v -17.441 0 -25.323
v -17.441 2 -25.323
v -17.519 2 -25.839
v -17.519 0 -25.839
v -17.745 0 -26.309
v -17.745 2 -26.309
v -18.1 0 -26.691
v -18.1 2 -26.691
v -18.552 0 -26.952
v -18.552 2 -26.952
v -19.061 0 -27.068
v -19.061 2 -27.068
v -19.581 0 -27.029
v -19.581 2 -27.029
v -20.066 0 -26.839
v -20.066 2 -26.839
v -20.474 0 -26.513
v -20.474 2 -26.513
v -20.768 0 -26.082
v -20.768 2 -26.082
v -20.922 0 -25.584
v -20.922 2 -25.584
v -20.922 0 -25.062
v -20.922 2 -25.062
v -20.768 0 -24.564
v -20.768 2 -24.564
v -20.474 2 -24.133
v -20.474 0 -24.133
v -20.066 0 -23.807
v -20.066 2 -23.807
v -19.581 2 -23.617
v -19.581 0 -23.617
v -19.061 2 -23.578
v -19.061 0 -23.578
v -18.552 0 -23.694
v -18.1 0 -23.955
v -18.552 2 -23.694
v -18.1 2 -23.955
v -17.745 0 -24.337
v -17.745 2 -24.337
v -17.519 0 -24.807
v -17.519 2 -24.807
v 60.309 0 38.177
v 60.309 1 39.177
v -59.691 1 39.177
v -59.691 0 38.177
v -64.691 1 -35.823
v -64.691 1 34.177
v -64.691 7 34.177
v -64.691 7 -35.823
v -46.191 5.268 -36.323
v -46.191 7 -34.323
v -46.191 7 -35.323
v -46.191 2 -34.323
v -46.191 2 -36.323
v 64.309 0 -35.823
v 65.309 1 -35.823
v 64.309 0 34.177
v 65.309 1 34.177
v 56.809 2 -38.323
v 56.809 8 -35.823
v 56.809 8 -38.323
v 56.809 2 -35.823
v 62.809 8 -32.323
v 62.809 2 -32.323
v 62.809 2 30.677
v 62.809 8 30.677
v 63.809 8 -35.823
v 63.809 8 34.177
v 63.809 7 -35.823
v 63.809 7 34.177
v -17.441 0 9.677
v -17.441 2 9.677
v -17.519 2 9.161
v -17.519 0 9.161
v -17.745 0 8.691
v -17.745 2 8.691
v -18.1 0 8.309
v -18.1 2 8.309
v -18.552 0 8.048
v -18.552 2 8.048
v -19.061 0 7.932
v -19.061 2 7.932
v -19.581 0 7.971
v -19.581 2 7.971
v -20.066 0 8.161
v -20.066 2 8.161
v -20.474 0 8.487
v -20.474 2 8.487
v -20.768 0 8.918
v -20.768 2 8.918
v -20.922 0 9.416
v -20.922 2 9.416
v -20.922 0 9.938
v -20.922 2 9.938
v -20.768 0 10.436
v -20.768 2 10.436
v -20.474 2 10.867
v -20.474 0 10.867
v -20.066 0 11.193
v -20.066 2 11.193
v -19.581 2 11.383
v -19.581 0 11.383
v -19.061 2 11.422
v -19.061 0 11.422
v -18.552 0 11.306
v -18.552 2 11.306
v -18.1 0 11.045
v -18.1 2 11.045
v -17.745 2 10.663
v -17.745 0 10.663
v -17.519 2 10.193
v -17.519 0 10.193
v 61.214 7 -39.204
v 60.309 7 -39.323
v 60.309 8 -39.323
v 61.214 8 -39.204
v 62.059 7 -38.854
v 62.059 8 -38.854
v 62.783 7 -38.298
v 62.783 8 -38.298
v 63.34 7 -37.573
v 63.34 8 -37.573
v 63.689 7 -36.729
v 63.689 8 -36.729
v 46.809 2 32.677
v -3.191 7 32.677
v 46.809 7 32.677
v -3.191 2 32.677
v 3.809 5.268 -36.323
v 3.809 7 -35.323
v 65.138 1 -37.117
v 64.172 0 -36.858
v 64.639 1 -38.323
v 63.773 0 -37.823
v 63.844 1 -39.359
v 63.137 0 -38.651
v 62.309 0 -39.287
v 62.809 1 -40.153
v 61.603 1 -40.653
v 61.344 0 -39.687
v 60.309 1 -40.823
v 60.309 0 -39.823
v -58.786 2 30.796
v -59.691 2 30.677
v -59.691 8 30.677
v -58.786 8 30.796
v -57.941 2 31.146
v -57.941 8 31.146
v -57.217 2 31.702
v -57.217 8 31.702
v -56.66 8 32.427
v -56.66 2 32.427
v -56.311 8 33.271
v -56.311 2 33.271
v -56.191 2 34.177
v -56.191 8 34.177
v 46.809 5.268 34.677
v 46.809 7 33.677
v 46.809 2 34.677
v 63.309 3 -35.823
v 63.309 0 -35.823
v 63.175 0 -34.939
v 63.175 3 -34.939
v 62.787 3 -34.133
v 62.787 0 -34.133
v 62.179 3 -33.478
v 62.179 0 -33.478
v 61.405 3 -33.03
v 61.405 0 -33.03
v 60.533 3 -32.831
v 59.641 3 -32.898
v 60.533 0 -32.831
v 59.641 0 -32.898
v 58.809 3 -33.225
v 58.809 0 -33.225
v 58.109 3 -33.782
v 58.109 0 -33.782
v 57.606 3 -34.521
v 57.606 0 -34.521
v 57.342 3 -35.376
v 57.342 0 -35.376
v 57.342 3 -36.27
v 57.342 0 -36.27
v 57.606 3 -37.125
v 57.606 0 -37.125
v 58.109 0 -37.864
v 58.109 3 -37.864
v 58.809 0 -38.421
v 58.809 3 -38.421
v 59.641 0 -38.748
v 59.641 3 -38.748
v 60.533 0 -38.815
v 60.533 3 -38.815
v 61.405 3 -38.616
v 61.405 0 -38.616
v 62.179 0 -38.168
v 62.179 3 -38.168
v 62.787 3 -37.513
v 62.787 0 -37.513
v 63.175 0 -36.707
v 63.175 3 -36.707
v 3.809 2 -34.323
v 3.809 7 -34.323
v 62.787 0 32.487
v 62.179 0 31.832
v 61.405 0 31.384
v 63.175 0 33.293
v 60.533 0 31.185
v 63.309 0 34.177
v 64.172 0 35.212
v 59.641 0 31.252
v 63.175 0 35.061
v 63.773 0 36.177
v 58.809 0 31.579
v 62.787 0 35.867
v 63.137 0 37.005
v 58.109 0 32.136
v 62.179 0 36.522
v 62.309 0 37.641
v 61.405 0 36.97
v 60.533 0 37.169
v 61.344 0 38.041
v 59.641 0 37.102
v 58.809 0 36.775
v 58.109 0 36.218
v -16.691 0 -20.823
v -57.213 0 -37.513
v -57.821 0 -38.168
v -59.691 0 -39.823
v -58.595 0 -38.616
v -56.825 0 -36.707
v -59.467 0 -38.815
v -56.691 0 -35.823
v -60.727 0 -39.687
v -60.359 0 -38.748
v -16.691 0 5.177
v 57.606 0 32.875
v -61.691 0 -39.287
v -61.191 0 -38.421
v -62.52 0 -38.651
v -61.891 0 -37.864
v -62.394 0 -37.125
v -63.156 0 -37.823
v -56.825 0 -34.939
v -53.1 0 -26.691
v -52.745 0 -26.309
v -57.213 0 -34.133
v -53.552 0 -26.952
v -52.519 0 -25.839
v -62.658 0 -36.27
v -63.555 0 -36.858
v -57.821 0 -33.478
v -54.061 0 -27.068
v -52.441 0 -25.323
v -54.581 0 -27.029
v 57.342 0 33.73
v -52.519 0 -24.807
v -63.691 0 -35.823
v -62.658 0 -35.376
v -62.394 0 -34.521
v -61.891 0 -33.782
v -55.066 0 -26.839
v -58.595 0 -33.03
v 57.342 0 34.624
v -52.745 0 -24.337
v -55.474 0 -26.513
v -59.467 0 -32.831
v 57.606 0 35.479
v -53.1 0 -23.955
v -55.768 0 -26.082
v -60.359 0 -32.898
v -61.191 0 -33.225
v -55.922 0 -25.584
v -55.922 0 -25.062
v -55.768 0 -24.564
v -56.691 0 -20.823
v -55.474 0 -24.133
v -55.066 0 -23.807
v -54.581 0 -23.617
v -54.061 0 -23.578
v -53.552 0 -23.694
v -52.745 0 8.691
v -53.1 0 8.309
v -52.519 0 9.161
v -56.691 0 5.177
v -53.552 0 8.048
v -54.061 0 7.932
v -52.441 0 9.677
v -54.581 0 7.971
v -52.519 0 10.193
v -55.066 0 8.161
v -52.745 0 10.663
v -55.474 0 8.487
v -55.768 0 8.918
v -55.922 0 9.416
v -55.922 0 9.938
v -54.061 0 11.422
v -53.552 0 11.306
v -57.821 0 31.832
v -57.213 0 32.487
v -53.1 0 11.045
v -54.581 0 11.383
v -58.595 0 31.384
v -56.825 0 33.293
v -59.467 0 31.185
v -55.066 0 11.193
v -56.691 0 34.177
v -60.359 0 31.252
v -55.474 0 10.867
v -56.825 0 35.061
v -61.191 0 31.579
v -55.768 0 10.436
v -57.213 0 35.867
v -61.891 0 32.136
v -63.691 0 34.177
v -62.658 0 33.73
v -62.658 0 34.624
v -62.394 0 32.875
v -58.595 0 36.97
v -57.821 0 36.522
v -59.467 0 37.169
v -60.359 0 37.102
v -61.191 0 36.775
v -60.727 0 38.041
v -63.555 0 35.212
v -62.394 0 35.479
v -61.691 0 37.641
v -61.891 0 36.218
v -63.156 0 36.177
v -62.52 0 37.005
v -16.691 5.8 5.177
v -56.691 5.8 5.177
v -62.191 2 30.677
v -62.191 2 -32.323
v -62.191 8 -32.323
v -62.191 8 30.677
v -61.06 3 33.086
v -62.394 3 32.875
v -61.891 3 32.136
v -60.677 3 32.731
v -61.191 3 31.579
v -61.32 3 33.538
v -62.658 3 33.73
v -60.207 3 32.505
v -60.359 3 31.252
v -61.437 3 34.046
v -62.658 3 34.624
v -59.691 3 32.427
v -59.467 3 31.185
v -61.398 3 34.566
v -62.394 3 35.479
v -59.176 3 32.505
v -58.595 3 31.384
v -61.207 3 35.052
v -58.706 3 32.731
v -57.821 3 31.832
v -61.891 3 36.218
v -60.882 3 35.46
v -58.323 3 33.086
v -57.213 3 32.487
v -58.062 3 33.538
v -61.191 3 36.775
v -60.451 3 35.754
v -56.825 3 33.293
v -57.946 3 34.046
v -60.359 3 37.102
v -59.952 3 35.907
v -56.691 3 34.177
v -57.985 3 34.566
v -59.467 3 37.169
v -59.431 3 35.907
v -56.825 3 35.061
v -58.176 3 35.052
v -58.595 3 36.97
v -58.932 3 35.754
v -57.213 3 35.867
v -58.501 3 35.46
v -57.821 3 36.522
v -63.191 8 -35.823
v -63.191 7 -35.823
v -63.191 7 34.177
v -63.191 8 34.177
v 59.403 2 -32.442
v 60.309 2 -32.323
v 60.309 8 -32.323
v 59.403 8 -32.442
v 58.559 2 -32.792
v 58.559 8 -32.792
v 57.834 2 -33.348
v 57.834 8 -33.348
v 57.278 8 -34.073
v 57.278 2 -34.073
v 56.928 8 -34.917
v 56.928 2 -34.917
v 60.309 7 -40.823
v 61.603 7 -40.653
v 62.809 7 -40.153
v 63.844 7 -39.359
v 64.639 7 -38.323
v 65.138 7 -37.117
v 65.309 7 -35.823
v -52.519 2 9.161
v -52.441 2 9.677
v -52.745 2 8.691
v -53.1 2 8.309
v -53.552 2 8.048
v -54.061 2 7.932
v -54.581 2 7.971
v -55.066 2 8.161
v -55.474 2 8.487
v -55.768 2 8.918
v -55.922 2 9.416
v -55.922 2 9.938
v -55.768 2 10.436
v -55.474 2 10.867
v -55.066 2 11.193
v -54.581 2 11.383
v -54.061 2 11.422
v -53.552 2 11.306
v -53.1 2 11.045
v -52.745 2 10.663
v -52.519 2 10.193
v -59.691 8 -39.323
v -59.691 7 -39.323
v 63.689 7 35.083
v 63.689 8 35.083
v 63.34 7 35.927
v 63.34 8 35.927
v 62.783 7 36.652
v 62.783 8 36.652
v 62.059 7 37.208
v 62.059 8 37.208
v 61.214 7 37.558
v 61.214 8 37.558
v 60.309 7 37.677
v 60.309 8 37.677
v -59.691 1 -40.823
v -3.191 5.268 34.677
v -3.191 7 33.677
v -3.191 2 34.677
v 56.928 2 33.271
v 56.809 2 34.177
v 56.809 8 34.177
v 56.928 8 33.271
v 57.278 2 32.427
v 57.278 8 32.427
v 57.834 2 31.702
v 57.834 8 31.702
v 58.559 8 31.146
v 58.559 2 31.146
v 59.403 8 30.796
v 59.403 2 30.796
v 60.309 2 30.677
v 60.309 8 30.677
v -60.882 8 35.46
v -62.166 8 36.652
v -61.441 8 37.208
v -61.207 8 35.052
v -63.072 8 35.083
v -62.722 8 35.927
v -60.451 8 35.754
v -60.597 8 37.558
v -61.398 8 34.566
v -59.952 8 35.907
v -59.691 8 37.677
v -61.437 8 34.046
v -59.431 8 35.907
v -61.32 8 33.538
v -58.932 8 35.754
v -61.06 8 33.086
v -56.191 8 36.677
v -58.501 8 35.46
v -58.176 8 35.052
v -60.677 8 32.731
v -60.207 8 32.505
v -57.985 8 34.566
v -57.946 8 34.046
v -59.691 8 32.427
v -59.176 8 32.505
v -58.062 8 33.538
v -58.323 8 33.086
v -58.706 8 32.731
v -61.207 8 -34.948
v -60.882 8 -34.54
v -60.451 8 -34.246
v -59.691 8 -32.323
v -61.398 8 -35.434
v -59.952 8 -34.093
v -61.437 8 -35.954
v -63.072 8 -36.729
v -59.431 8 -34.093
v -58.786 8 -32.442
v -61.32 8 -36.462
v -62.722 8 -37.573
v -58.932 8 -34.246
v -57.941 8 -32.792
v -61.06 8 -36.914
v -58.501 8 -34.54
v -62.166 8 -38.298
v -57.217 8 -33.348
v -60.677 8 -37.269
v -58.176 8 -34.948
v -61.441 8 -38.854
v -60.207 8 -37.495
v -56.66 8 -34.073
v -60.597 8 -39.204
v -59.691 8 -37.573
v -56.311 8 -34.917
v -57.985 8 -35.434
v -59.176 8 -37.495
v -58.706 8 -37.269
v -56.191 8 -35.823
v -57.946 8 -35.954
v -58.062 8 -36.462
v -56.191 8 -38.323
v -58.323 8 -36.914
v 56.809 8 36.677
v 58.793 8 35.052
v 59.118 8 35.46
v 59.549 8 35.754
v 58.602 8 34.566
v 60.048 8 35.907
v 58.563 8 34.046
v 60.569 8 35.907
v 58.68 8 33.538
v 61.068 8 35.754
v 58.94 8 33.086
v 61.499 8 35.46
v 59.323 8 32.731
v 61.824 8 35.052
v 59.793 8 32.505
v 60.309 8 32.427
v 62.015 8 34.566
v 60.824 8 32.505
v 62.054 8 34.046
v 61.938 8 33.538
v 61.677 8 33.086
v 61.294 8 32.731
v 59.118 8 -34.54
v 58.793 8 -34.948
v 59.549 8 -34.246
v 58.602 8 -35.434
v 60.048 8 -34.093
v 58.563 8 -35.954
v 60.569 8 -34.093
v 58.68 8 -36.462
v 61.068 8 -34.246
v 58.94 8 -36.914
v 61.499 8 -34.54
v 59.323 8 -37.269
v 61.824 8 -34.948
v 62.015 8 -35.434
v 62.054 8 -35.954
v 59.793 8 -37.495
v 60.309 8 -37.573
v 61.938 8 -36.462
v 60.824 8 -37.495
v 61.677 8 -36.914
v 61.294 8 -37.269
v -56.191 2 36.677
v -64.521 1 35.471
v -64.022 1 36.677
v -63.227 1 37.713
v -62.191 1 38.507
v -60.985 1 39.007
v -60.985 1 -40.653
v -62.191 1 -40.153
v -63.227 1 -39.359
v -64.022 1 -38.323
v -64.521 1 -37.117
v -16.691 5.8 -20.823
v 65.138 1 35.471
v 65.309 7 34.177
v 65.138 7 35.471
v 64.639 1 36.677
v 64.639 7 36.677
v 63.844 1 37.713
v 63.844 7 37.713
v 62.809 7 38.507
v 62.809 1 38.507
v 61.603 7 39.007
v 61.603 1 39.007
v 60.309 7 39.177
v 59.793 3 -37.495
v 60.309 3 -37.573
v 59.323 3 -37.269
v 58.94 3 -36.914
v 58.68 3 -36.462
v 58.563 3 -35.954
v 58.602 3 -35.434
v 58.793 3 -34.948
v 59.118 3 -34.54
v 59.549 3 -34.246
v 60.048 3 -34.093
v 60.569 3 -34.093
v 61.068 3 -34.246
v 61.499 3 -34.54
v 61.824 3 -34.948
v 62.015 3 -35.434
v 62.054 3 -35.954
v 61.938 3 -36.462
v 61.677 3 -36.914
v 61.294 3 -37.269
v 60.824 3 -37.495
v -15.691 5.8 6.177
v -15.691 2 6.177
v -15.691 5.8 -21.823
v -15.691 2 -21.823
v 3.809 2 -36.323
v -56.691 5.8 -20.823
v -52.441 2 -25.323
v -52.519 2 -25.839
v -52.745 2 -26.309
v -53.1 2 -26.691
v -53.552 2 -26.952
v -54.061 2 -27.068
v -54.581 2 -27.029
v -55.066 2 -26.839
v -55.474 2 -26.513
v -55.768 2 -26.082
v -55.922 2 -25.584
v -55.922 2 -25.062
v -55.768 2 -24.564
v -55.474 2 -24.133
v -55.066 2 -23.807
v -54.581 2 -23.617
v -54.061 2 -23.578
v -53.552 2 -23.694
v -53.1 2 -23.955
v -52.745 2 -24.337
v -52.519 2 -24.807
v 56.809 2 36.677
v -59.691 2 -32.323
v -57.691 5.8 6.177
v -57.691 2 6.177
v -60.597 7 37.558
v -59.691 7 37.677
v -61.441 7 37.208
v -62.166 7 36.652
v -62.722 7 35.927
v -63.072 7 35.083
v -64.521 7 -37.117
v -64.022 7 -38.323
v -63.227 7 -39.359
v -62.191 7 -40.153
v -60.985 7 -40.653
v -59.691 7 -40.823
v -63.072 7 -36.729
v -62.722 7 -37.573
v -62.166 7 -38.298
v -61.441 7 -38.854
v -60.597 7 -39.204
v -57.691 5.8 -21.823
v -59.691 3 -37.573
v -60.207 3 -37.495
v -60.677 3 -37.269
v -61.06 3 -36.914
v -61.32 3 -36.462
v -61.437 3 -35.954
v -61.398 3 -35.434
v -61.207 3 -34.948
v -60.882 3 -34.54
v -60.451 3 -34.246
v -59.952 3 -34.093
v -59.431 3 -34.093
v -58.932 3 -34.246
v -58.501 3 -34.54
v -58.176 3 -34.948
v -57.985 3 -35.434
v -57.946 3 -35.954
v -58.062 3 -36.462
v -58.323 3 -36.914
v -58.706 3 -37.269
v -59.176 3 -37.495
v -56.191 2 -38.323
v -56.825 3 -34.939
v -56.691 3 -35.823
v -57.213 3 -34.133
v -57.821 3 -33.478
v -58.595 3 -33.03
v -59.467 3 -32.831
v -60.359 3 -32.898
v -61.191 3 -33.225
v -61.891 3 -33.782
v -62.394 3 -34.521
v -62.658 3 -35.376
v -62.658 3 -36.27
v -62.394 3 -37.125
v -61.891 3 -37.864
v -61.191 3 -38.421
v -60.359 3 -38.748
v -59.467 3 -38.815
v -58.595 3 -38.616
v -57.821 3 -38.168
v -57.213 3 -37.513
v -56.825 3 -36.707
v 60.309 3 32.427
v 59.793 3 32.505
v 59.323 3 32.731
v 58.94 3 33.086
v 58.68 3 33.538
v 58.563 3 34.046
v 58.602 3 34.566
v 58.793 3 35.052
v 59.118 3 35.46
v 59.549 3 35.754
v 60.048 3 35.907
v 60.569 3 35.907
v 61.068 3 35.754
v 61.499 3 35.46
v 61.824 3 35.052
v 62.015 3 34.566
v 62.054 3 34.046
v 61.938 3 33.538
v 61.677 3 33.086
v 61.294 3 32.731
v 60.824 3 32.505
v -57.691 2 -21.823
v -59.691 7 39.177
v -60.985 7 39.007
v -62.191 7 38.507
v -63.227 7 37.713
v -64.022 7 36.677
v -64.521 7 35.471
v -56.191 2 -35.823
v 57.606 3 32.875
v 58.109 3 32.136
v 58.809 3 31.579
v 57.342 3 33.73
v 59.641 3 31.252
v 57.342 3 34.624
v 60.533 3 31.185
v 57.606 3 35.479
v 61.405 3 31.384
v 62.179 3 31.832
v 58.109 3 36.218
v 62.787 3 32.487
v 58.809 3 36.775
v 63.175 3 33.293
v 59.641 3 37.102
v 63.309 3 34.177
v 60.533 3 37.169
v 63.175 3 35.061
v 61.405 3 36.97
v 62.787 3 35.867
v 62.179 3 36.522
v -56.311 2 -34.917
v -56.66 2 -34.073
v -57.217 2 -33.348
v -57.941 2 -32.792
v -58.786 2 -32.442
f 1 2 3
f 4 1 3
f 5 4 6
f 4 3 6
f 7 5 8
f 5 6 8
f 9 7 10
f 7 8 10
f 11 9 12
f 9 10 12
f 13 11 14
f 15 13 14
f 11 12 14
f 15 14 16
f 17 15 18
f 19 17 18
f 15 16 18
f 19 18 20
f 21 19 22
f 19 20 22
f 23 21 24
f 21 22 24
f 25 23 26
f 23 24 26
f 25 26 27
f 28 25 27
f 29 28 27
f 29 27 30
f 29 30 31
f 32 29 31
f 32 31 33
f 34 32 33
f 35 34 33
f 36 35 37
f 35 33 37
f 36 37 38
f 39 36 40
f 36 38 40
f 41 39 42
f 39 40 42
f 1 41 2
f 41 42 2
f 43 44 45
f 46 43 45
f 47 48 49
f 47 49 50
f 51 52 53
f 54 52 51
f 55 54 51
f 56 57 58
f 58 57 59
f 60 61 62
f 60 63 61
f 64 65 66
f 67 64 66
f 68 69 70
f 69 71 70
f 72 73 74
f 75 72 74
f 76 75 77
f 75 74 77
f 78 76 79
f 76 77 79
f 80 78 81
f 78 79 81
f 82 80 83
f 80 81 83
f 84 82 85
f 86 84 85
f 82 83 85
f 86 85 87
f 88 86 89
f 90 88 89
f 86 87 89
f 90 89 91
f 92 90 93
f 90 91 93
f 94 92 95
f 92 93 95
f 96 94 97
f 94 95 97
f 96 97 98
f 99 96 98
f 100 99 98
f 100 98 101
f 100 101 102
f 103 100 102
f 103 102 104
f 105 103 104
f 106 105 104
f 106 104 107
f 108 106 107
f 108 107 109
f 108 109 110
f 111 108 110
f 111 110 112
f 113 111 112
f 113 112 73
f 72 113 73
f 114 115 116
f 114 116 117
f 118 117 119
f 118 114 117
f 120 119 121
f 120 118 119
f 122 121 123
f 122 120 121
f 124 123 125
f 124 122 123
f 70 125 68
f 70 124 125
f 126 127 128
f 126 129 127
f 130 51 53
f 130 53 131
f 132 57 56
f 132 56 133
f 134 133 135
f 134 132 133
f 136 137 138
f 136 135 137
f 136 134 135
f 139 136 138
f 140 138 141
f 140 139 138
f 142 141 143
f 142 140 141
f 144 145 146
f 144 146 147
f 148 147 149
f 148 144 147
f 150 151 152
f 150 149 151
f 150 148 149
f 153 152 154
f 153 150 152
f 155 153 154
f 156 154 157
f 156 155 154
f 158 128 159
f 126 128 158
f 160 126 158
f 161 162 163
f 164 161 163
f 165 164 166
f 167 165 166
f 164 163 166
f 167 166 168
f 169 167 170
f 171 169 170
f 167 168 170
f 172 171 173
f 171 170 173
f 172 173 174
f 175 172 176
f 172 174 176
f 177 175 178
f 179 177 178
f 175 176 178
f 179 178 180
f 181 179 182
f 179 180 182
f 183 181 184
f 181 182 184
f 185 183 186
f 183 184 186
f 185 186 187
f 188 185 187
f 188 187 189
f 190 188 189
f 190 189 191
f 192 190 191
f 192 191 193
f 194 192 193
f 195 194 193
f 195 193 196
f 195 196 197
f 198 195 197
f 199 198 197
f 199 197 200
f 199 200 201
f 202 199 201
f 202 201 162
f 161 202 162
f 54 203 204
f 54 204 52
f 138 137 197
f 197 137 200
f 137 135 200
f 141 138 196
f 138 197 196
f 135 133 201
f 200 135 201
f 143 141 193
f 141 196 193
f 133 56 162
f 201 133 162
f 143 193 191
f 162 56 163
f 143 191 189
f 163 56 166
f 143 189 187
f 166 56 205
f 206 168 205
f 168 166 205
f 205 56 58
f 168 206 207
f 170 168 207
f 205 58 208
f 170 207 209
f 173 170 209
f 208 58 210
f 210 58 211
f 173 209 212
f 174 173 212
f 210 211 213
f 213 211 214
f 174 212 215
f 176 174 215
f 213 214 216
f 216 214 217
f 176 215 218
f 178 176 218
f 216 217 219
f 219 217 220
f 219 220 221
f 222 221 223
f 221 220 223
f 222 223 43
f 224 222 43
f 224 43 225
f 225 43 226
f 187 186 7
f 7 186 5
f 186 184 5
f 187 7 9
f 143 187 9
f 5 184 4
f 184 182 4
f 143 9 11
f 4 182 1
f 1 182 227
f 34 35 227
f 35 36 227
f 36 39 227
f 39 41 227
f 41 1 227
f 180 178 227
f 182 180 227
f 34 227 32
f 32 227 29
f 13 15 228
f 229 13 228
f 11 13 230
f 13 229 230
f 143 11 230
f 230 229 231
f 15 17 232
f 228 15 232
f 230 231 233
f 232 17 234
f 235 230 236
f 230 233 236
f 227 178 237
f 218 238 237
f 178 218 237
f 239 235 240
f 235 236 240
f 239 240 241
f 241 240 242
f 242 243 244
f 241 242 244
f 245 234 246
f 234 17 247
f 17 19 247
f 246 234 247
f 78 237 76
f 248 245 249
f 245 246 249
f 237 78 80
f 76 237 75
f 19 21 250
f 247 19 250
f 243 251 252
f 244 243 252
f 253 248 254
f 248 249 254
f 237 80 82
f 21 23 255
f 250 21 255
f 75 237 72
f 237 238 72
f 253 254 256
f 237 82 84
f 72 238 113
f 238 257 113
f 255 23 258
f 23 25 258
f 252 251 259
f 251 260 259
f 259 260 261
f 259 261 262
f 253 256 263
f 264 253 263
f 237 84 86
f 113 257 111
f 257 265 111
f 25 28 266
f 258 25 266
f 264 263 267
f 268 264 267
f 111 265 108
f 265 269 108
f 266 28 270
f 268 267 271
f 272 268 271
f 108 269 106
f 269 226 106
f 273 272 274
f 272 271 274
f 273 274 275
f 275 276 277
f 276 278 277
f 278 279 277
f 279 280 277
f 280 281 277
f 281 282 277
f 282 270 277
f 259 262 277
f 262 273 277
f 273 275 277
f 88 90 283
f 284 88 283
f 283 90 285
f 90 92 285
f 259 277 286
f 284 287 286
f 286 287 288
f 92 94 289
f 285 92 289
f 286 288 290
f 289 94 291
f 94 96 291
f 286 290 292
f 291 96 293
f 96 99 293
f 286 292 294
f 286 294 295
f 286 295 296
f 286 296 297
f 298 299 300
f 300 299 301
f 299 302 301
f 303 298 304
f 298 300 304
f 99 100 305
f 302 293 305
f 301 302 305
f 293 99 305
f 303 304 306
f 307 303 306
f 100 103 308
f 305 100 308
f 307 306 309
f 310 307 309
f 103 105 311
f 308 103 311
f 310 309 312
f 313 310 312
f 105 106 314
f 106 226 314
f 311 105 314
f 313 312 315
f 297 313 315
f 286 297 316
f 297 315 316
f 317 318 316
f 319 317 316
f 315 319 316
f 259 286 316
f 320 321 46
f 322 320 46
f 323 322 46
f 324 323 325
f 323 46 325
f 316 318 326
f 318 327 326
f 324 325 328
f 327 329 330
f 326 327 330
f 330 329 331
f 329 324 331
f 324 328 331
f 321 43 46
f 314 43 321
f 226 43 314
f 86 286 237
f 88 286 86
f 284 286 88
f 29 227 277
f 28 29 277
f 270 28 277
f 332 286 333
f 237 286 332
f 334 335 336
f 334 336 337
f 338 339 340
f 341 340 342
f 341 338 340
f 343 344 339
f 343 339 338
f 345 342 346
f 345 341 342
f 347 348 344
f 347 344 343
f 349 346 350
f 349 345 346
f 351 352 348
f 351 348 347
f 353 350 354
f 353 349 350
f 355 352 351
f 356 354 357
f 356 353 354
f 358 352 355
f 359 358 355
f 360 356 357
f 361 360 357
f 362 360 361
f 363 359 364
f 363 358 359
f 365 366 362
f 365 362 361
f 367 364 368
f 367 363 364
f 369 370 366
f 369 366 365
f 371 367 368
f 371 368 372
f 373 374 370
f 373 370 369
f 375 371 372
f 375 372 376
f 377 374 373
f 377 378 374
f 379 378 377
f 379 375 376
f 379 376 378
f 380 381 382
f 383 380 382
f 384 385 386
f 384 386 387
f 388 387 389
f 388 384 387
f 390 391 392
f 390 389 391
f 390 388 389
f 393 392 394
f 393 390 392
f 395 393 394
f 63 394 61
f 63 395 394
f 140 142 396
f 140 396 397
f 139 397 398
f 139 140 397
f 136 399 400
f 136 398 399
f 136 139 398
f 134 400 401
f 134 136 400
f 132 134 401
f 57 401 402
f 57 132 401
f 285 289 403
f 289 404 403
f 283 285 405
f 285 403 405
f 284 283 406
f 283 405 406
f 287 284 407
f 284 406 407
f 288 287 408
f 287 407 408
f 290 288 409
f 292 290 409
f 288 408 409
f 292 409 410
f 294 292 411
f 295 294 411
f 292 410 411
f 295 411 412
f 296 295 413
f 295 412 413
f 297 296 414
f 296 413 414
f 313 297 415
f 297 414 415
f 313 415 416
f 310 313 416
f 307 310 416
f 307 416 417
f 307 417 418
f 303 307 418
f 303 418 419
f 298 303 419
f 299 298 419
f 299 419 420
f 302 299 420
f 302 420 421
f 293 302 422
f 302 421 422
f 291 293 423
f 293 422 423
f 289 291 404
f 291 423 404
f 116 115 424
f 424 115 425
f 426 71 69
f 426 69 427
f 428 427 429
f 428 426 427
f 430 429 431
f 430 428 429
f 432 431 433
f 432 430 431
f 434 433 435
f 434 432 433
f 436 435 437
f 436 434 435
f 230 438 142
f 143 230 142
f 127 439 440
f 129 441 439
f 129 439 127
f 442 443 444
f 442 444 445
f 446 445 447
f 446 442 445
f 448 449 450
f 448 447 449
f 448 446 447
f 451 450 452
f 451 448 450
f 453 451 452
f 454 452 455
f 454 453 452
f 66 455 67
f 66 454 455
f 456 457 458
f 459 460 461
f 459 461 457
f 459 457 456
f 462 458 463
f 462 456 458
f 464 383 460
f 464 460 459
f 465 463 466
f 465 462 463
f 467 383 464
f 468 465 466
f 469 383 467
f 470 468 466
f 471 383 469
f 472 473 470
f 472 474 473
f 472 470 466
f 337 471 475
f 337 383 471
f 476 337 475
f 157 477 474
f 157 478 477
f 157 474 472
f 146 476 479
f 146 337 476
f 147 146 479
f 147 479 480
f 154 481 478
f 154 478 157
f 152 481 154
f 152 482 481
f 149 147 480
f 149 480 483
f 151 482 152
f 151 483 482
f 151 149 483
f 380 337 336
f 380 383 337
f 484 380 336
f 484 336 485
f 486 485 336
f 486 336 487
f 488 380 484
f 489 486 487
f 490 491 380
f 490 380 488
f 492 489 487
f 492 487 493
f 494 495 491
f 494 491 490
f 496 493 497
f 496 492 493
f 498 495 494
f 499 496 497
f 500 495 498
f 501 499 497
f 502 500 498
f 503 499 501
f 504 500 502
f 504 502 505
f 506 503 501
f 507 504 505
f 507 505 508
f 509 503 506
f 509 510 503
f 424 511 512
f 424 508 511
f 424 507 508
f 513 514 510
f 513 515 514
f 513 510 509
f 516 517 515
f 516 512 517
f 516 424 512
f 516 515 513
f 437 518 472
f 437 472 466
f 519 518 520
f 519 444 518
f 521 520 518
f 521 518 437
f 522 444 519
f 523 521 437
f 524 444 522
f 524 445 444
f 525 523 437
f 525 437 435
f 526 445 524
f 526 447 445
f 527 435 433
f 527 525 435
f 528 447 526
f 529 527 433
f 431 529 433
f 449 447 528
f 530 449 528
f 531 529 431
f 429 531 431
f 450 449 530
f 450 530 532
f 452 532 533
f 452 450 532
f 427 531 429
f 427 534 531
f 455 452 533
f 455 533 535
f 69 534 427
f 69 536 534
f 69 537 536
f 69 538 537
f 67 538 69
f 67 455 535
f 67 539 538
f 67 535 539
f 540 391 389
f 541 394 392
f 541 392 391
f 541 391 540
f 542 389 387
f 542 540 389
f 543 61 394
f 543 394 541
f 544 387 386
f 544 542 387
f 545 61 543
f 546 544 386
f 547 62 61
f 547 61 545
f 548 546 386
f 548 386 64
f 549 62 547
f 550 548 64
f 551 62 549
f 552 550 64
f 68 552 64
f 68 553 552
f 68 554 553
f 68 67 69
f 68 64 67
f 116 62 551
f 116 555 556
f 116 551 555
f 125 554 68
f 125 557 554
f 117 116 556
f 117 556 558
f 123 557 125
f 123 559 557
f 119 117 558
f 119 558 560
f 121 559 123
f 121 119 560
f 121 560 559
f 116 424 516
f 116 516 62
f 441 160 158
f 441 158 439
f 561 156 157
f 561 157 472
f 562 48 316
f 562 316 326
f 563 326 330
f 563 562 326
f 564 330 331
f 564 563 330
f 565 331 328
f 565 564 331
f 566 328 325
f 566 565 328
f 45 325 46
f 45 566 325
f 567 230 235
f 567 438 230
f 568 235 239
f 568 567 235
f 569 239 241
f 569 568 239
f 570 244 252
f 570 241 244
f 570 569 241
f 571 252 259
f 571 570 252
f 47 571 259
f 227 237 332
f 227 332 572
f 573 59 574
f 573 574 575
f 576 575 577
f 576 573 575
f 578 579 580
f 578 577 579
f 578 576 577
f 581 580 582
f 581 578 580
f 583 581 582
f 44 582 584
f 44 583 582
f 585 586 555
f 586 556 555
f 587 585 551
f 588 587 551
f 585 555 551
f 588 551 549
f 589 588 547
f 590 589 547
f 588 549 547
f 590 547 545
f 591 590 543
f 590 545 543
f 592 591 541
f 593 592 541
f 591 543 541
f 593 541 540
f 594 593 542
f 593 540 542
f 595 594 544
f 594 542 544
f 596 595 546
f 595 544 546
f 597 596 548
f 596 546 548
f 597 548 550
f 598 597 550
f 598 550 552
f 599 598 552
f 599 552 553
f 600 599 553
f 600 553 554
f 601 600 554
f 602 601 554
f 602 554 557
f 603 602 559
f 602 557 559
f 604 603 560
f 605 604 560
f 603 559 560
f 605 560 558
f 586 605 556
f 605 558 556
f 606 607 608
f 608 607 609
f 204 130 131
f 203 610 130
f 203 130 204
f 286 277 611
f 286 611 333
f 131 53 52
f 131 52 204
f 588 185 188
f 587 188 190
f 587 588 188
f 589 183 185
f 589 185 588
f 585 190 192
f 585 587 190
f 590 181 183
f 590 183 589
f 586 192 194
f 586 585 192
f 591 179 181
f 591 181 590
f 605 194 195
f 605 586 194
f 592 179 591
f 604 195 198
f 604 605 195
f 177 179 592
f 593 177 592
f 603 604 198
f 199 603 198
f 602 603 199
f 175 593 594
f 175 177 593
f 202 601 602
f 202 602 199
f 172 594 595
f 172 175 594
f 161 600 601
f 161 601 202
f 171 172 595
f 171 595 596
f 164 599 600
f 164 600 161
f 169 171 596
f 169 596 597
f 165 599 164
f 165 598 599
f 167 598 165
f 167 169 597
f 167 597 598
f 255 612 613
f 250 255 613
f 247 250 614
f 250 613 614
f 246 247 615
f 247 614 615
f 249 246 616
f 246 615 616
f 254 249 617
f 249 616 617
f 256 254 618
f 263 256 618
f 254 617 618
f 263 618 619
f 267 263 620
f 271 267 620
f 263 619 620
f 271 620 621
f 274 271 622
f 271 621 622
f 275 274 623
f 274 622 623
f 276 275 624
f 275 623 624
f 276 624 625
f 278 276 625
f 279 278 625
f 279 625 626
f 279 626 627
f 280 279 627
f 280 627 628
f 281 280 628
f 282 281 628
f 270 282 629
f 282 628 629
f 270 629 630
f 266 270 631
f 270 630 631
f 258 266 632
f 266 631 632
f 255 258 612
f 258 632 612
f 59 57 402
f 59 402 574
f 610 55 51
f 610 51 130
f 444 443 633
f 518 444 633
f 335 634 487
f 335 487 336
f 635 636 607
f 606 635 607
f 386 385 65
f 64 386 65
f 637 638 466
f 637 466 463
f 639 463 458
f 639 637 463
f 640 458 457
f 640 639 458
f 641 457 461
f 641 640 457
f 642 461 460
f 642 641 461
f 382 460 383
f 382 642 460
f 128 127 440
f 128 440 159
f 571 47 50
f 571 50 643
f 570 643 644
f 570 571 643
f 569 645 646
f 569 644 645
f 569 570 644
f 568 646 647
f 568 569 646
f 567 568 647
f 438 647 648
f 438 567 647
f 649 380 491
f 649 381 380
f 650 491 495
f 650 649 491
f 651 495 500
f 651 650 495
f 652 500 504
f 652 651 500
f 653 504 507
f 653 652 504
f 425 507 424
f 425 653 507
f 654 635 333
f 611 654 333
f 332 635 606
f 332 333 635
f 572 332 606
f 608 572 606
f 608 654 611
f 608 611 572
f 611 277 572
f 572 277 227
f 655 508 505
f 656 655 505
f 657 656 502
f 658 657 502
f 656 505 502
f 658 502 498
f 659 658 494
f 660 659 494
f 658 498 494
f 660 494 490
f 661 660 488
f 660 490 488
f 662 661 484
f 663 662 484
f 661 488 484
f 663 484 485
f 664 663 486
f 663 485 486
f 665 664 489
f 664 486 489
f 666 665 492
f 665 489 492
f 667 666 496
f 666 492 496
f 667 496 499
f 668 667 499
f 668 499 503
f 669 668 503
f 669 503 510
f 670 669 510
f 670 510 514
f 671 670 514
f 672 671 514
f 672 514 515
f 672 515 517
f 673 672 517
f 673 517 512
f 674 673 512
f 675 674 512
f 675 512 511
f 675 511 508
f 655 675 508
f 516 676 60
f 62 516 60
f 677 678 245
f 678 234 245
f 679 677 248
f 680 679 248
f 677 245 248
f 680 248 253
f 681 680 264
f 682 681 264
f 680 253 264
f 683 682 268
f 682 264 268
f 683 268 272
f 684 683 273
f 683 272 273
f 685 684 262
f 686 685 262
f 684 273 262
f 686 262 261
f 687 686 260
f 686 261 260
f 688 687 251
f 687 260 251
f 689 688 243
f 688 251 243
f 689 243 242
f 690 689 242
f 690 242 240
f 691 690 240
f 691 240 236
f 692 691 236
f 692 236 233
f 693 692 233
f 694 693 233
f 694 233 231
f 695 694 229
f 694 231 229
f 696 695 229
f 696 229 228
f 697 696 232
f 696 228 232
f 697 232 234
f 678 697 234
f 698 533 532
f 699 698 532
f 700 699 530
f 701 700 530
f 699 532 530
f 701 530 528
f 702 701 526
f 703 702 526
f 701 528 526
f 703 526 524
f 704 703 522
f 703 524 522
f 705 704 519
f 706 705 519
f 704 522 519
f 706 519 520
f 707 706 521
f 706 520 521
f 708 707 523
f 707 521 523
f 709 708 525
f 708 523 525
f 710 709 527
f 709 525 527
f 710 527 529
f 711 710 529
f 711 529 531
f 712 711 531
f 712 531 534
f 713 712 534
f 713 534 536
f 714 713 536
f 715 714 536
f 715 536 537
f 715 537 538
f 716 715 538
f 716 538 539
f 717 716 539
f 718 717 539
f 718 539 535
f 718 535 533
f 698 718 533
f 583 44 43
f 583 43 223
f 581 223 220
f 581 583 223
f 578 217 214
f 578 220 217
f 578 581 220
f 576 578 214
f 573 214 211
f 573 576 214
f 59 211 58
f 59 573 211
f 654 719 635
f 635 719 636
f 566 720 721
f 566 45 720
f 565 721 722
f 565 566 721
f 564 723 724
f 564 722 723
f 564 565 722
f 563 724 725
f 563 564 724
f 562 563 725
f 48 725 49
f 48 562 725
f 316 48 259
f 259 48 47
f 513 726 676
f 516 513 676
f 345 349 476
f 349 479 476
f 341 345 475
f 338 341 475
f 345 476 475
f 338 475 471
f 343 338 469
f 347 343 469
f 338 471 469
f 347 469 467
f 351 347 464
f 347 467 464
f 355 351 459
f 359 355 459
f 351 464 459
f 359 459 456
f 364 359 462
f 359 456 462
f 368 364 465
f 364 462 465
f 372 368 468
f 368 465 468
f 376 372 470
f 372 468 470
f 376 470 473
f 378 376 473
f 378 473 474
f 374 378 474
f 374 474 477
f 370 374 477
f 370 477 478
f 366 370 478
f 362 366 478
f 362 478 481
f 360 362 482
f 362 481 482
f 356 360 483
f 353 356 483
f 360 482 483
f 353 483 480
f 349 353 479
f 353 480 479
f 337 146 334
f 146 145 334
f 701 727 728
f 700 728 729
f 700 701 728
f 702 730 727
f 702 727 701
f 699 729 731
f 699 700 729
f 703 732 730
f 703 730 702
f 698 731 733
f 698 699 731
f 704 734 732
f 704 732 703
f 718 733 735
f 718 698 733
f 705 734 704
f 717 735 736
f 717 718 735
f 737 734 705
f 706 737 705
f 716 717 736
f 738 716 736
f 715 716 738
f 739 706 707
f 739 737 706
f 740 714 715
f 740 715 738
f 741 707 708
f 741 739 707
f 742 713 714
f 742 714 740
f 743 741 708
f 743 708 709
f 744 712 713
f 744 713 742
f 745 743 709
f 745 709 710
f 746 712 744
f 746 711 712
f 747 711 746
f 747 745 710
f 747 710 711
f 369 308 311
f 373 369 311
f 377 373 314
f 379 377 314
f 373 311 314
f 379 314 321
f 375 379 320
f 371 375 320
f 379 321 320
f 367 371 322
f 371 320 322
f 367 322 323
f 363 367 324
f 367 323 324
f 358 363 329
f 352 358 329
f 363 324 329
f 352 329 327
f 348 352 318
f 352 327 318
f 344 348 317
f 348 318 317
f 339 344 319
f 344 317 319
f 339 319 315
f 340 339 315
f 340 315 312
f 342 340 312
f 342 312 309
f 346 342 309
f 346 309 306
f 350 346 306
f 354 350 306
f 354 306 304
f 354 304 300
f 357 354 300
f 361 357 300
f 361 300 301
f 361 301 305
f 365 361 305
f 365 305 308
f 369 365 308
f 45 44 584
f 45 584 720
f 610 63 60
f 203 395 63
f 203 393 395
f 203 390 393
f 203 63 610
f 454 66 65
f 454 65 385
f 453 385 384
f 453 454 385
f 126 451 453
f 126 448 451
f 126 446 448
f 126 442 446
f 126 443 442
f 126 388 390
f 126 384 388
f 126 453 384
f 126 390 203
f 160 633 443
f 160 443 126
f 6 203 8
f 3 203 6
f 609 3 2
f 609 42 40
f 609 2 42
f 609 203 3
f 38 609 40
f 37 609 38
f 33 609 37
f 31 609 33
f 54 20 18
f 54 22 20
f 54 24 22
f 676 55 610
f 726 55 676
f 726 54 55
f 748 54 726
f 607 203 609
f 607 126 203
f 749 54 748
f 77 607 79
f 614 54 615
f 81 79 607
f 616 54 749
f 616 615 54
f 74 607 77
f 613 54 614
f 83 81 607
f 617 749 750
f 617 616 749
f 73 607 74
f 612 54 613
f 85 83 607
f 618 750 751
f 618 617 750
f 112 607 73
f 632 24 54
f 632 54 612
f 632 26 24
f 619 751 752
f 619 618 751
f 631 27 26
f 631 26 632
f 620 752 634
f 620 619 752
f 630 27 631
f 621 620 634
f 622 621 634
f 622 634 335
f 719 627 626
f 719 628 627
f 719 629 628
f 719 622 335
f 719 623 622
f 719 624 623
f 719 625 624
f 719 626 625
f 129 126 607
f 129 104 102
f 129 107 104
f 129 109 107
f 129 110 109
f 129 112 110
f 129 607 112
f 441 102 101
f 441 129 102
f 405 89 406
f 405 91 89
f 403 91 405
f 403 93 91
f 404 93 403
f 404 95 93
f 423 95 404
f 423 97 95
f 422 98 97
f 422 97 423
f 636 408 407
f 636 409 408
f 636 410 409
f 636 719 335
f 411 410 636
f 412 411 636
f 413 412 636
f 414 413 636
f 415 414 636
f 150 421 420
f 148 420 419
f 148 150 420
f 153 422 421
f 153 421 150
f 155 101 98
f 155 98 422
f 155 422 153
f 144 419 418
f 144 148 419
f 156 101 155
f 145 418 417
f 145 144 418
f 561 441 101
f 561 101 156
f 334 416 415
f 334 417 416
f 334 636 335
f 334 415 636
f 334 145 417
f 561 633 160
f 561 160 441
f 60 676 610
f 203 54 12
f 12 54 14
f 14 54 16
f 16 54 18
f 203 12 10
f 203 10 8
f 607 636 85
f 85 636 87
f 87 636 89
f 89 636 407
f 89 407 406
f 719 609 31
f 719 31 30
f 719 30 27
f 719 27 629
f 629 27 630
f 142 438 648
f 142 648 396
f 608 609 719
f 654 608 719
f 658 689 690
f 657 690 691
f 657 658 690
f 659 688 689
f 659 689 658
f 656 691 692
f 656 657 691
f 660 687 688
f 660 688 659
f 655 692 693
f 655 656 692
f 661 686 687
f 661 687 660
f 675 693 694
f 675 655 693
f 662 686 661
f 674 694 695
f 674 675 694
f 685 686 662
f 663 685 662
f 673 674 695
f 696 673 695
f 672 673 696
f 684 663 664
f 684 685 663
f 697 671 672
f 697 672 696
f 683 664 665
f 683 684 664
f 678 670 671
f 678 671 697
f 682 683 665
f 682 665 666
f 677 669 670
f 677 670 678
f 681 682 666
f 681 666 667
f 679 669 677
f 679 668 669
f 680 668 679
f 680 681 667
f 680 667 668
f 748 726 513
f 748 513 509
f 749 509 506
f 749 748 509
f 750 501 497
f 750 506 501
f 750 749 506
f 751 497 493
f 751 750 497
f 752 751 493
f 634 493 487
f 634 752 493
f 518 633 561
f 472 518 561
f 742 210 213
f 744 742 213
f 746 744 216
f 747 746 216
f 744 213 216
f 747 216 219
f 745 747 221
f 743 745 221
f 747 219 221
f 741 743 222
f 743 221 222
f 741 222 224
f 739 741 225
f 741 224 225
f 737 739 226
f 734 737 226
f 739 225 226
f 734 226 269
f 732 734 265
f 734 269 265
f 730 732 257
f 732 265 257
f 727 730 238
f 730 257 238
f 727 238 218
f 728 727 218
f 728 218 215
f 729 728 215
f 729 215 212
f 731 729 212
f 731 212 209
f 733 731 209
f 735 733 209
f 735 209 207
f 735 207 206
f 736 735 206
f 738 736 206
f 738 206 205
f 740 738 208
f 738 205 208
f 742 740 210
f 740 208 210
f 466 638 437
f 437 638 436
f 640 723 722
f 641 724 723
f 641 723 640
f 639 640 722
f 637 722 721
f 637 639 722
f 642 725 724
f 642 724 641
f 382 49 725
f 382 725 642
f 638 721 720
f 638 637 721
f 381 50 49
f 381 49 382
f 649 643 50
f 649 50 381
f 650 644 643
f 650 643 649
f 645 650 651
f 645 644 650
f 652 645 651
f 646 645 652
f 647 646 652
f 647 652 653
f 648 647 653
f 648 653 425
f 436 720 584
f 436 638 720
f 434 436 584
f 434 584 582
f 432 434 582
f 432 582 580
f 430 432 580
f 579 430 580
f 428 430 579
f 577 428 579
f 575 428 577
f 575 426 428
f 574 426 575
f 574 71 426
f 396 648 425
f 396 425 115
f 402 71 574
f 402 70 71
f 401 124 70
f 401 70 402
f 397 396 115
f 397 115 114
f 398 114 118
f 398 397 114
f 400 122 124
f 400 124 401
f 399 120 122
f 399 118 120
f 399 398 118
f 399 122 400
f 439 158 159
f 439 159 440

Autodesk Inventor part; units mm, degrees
ref_plane "YZ Plane" through (0, 0, 0) normal (1, 0, 0) x (0, 1, 0)
ref_plane "XZ Plane" through (0, 0, 0) normal (0, 1, 0) x (-1, 0, 0)
ref_plane "XY Plane" through (0, 0, 0) normal (0, 0, 1) x (1, 0, 0)
sketch "Sketch1" plane through (0, 0, 0) normal (0, 1, 0) x (-1, 0, 0)
  line L0 (59.6914, -40.823) -> (-60.3086, -40.823)
  line L1 (-65.3086, -35.823) -> (-65.3086, 34.177)
  line L2 (-60.3086, 39.177) -> (59.6914, 39.177)
  line L3 (64.6914, 34.177) -> (64.6914, -35.823)
  arc A0 (59.6914, -40.823) -> (64.6914, -35.823) centre (59.6914, -35.823) ccw
  arc A1 (-65.3086, -35.823) -> (-60.3086, -40.823) centre (-60.3086, -35.823) ccw
  arc A2 (64.6914, 34.177) -> (59.6914, 39.177) centre (59.6914, 34.177) ccw
  arc A3 (-60.3086, 39.177) -> (-65.3086, 34.177) centre (-60.3086, 34.177) ccw
  point P0 (0, 0)
  point P1 (64.6914, -40.823)
  point P2 (-65.3086, 39.177)
  point P3 (64.6914, 39.177)
  dimension "d0" = 80
  dimension "d1" = 130
  dimension "d2" = 5
  dimension "d3" = 5
  dimension "d4" = 5
  dimension "d5" = 5
extrude "Extrusion1" add sketch "Sketch1" along normal blind 2
sketch "Sketch2" plane through (0, 2, 0) normal (0, 1, 0) x (1, 0, 0)
  line L0 (-64.6914, 35.823) -> (-64.6914, -34.177) projected
  line L1 (-64.6914, 35.823) -> (-64.6914, -34.177)
  arc A0 (-64.6914, -34.177) -> (-59.6914, -39.177) centre (-59.6914, -34.177) ccw projected
  arc A1 (-64.6914, -34.177) -> (-59.6914, -39.177) centre (-59.6914, -34.177) ccw
  arc A2 (-59.6914, 40.823) -> (-64.6914, 35.823) centre (-59.6914, 35.823) ccw
  arc A3 (65.3086, 35.823) -> (60.3086, 40.823) centre (60.3086, 35.823) ccw projected
  arc A4 (65.3086, 35.823) -> (60.3086, 40.823) centre (60.3086, 35.823) ccw
  line L2 (-62.1914, 35.823) -> (-62.1914, -34.177)
  line L3 (65.3086, -34.177) -> (65.3086, 35.823) projected
  line L4 (65.3086, 35.823) -> (65.3086, -34.177)
  arc A5 (60.3086, -39.177) -> (65.3086, -34.177) centre (60.3086, -34.177) ccw projected
  line L5 (-59.6914, -39.177) -> (60.3086, -39.177) projected
  line L6 (60.3086, -39.177) -> (-59.6914, -39.177)
  line L7 (60.3086, 40.823) -> (-59.6914, 40.823) projected
  line L8 (-59.6914, 40.823) -> (60.3086, 40.823)
  line L9 (62.8086, 35.823) -> (62.8086, -34.177)
  line L10 (60.3086, -36.677) -> (-59.6914, -36.677)
  line L11 (-59.6914, 38.323) -> (60.3086, 38.323)
  arc A6 (-59.6914, 38.323) -> (-62.1914, 35.823) centre (-59.6914, 35.823) ccw
  arc A7 (62.8086, 35.823) -> (60.3086, 38.323) centre (60.3086, 35.823) ccw
  arc A8 (60.3086, -36.677) -> (62.8086, -34.177) centre (60.3086, -34.177) ccw
  arc A9 (-62.1914, -34.177) -> (-59.6914, -36.677) centre (-59.6914, -34.177) ccw
  arc A10 (-59.6914, 39.323) -> (-63.1914, 35.823) centre (-59.6914, 35.823) ccw
  arc A11 (63.8086, 35.823) -> (60.3086, 39.323) centre (60.3086, 35.823) ccw
  arc A12 (60.3086, -37.677) -> (63.8086, -34.177) centre (60.3086, -34.177) ccw
  arc A13 (-63.1914, -34.177) -> (-59.6914, -37.677) centre (-59.6914, -34.177) ccw
  line L12 (-63.1914, 35.823) -> (-63.1914, -34.177)
  line L13 (-59.6914, -37.677) -> (60.3086, -37.677)
  line L14 (63.8086, -34.177) -> (63.8086, 35.823)
  line L15 (60.3086, 39.323) -> (-59.6914, 39.323)
  line L16 (-59.6914, 32.323) -> (-62.1914, 32.323)
  line L17 (-56.1914, 35.823) -> (-56.1914, 38.323)
  arc A14 (-59.6914, 32.323) -> (-56.1914, 35.823) centre (-59.6914, 35.823) ccw
  line L18 (0.3086, 40.823) -> (0.3086, 33.323)
  line L19 (65.3086, 0.823) -> (44.6486, 0.823)
  line L20 (60.3086, 32.323) -> (62.8086, 32.323)
  line L21 (56.8086, 35.823) -> (56.8086, 38.323)
  arc A15 (56.8086, 35.823) -> (60.3086, 32.323) centre (60.3086, 35.823) ccw
  line L22 (-59.6914, -30.677) -> (-62.1914, -30.677)
  line L23 (-56.1914, -34.177) -> (-56.1914, -36.677)
  arc A16 (-56.1914, -34.177) -> (-59.6914, -30.677) centre (-59.6914, -34.177) ccw
  line L24 (56.8086, -34.177) -> (56.8086, -36.677)
  arc A17 (60.3086, -30.677) -> (56.8086, -34.177) centre (60.3086, -34.177) ccw
  line L25 (60.3086, -30.677) -> (62.8086, -30.677)
  point P0 (0, 0)
  point P1 (60.3086, -34.2192)
  point P2 (65.3086, -34.2192)
  point P3 (59.6599, -39.177)
  point P4 (56.8086, 38.323)
  point P5 (62.8086, -30.677)
  point P6 (56.8086, -36.677)
  point P7 (-56.1914, -36.677)
  point P8 (-62.1914, -30.677)
  dimension "d51" = 5
  dimension "d8" = 2.5
  dimension "d9" = 2.5
  dimension "d10" = 2.5
  dimension "d11" = 2.5
  dimension "d12" = 7
  dimension "d13" = 7
  dimension "d14" = 7
  dimension "d15" = 7
  dimension "d34" = 3.5
  dimension "d50" = 2.5
  dimension "d52" = 5
  dimension "d53" = 2.5
extrude "Extrusion2" add sketch "Sketch2" along normal blind 5 contours A2 L7 L18 L15 A10 L12 A13 L13 A12 L14 L19 L3 A5 L5 A0 L0 | L7 A3 L3 L19 L14 A11 L15 L18 | L17 A14 L16 L2 A6 L11 | L11 A7 L9 L20 A15 L21 | L9 A8 L10 L24 A17 L25 | L22 A16 L23 L10 A9 L2
extrude "Extrusion3" add sketch "Sketch2" along normal blind 6 contours L18 L11 A6 L2 A9 L10 A8 L9 L19 L14 A12 L13 A13 L12 A10 L15 | L15 A11 L14 L19 L9 A7 L11 L18 | L17 A14 L16 L2 A6 L11 | L11 A7 L9 L20 A15 L21 | L9 A8 L10 L24 A17 L25 | L22 A16 L23 L10 A9 L2
sketch "Sketch3" plane through (0, 0, 0) normal (0, -1, 0) x (1, 0, 0)
  circle A0 centre (60.3086, 34.177) radius 3
  line L0 (-59.6914, 39.177) -> (60.3086, 39.177) projected
  line L1 (65.3086, 34.177) -> (65.3086, -35.823) projected
  line L2 (65.3086, 24.0261) -> (65.3086, 17.2129)
  line L3 (38.477, 39.177) -> (29.3328, 39.177)
  line L4 (-59.6914, 39.177) -> (60.3086, 39.177) projected
  circle A1 centre (60.3086, -35.823) radius 3
  circle A2 centre (-59.6914, 34.177) radius 3
  circle A3 centre (-59.6914, -35.823) radius 3
  line L5 (-64.6914, -35.823) -> (-64.6914, 34.177) projected
  line L6 (60.3086, -40.823) -> (-59.6914, -40.823) projected
  point P0 (0, 0)
  point P1 (33.602, 39.1426)
  point P2 (55.3086, 34.177)
  point P3 (65.3086, -35.823)
  dimension "d20" = 6
  dimension "d21" = 5
  dimension "d26" = 70
  dimension "d29" = 120
  dimension "d54" = 130
  dimension "d55" = 80
  dimension "d56" = 5
extrude "Extrusion4" cut sketch "Sketch3" against normal blind 3
sketch "Sketch4" plane through (60.3086, 3, -35.823) normal (0, -1, 0) x (1, 0, 0)
  circle A0 centre (0, 0) radius 3 projected
  point P0 (-60.3086, 35.823)
hole "Hole1" at (60.3086, 3, -35.823) direction (0, 1, 0) diameter 3.5 end through all
pattern_linear "Rectangular Pattern1" count 2 spacing 120 along (-1, 0, 0) count 2 spacing 70 along (0, 0, 1) of "Hole1"
chamfer "Chamfer1" distance 1 angle 45 8 edges at (0.3086, 0, 39.177) (63.8442, 0, 37.7125) (65.3086, 0, -0.823) (63.8442, 0, -39.3586) (0.3086, 0, -40.823) (-63.2269, 0, -39.3586) (-64.6914, 0, -0.823) (-63.2269, 0, 37.7125)
sketch "Sketch9" plane through (0, 0, 0) normal (0, -1, 0) x (1, 0, 0)
  line L0 (-8.8254, 34.5739) -> (9.2353, 34.5739) construction
  line L1 (9.2353, 34.5739) -> (9.2353, 29.7737) construction
  line L2 (9.2353, 29.7737) -> (-8.8254, 29.7737) construction
  line L3 (-8.8254, 29.7737) -> (-8.8254, 34.5739) construction
  point P0 (0, 0)
sketch "Sketch10" plane through (0, 2, 0) normal (0, 1, 0) x (1, 0, 0)
  line L0 (46.8086, -34.677) -> (-3.1914, -34.677)
  line L1 (-3.1914, -34.677) -> (-3.1914, -32.677)
  line L2 (-3.1914, -32.677) -> (46.8086, -32.677)
  line L3 (46.8086, -32.677) -> (46.8086, -34.677)
  line L4 (56.8086, -34.177) -> (56.8086, -36.677) projected
  line L5 (56.8086, -36.677) -> (-56.1914, -36.677) projected
  line L6 (-46.1914, 36.323) -> (3.8086, 36.323)
  line L7 (3.8086, 36.323) -> (3.8086, 34.323)
  line L8 (3.8086, 34.323) -> (-46.1914, 34.323)
  line L9 (-46.1914, 34.323) -> (-46.1914, 36.323)
  line L10 (-56.1914, 38.323) -> (56.8086, 38.323) projected
  line L11 (-56.1914, 35.823) -> (-56.1914, 38.323) projected
  point P0 (0, 0)
  point P1 (56.8086, -35.427)
  point P2 (46.8086, -33.677)
  point P3 (-3.1914, -36.677)
  point P4 (-46.1914, 35.323)
  point P5 (-56.1914, 37.073)
  dimension "d97" = 50
  dimension "d98" = 2
  dimension "d99" = 10
  dimension "d100" = 2
  dimension "d110" = 50
  dimension "d111" = 2
  dimension "d112" = 2
  dimension "d113" = 10
extrude "Extrusion7" add sketch "Sketch10" along normal blind 5
chamfer "Chamfer2" distance 1 angle 60 1 edges at (21.8086, 7, 34.677) measured on face at (13.4753, 7, 33.3436)
chamfer "Chamfer4" distance 1 angle 60 1 edges at (-21.1914, 7, -36.323) measured on face at (-29.5247, 7, -35.6564)
sketch "Sketch11" plane through (0, 0, 0) normal (0, -1, 0) x (1, 0, 0)
  line L0 (-56.6914, 5.177) -> (-16.6914, 5.177)
  line L1 (-16.6914, 5.177) -> (-16.6914, -20.823)
  line L2 (-16.6914, -20.823) -> (-56.6914, -20.823)
  line L3 (-56.6914, -20.823) -> (-56.6914, 5.177)
  line L4 (-64.6914, 34.177) -> (-64.6914, -35.823) projected
  line L5 (-59.6914, -40.823) -> (60.3086, -40.823) projected
  point P0 (0, 0)
  dimension "d117" = 40
  dimension "d118" = 26
  dimension "d119" = 8
  dimension "d120" = 20
extrude "Extrusion8" cut sketch "Sketch11" against normal blind 10
sketch "Sketch12" plane through (0, 2, 0) normal (0, 1, 0) x (1, 0, 0)
  line L0 (-57.6914, 28.823) -> (-15.6914, 28.823)
  line L1 (-15.6914, 28.823) -> (-15.6914, -13.177)
  line L2 (-15.6914, -13.177) -> (-57.6914, -13.177)
  line L3 (-57.6914, -13.177) -> (-57.6914, 28.823)
  line L4 (-16.6914, -5.177) -> (-56.6914, -5.177) projected
  line L5 (-16.6914, 20.823) -> (-16.6914, -5.177) projected
  circle A0 centre (-54.1914, 25.323) radius 1.75
  circle A1 centre (-19.1914, 25.323) radius 1.75
  circle A2 centre (-54.1914, -9.677) radius 1.75
  circle A3 centre (-19.1914, -9.677) radius 1.75
  point P0 (0, 0)
  dimension "d127" = 42
  dimension "d128" = 42
  dimension "d129" = 8
  dimension "d130" = 1
  dimension "d131" = 3.5
  dimension "d132" = 3.5
  dimension "d133" = 3.5
  dimension "d136" = 35
  dimension "d139" = 35
extrude "Extrusion9" cut sketch "Sketch12" against normal blind 10 contours A0 | A1 | A2 | A3
sketch "Sketch13" plane through (0, 2, 0) normal (0, 1, 0) x (1, 0, 0)
  line L0 (-57.6914, -6.177) -> (-15.6914, -6.177)
  line L1 (-15.6914, -6.177) -> (-15.6914, 21.823)
  line L2 (-15.6914, 21.823) -> (-57.6914, 21.823)
  line L3 (-57.6914, 21.823) -> (-57.6914, -6.177)
  line L4 (-56.6914, 20.823) -> (-16.6914, 20.823) projected
  line L5 (-56.6914, -5.177) -> (-16.6914, -5.177)
  line L6 (-16.6914, -5.177) -> (-16.6914, 20.823)
  line L7 (-16.6914, 20.823) -> (-56.6914, 20.823)
  line L8 (-56.6914, 20.823) -> (-56.6914, -5.177)
  point P0 (0, 0)
  dimension "d144" = 1
  dimension "d145" = 1
  dimension "d146" = 1
  dimension "d147" = 1
extrude "Extrusion10" add sketch "Sketch13" along normal blind 3.8
equation "\"d3\" = d2"
equation "\"d4\" = d2"
equation "\"d5\" = d2"
equation "\"d9\" = d8"
equation "\"d10\" = d8"
equation "\"d11\" = d8"
equation "\"d52\" = d51"
equation "\"d53\" = d50"
properties part number "housing_top"
